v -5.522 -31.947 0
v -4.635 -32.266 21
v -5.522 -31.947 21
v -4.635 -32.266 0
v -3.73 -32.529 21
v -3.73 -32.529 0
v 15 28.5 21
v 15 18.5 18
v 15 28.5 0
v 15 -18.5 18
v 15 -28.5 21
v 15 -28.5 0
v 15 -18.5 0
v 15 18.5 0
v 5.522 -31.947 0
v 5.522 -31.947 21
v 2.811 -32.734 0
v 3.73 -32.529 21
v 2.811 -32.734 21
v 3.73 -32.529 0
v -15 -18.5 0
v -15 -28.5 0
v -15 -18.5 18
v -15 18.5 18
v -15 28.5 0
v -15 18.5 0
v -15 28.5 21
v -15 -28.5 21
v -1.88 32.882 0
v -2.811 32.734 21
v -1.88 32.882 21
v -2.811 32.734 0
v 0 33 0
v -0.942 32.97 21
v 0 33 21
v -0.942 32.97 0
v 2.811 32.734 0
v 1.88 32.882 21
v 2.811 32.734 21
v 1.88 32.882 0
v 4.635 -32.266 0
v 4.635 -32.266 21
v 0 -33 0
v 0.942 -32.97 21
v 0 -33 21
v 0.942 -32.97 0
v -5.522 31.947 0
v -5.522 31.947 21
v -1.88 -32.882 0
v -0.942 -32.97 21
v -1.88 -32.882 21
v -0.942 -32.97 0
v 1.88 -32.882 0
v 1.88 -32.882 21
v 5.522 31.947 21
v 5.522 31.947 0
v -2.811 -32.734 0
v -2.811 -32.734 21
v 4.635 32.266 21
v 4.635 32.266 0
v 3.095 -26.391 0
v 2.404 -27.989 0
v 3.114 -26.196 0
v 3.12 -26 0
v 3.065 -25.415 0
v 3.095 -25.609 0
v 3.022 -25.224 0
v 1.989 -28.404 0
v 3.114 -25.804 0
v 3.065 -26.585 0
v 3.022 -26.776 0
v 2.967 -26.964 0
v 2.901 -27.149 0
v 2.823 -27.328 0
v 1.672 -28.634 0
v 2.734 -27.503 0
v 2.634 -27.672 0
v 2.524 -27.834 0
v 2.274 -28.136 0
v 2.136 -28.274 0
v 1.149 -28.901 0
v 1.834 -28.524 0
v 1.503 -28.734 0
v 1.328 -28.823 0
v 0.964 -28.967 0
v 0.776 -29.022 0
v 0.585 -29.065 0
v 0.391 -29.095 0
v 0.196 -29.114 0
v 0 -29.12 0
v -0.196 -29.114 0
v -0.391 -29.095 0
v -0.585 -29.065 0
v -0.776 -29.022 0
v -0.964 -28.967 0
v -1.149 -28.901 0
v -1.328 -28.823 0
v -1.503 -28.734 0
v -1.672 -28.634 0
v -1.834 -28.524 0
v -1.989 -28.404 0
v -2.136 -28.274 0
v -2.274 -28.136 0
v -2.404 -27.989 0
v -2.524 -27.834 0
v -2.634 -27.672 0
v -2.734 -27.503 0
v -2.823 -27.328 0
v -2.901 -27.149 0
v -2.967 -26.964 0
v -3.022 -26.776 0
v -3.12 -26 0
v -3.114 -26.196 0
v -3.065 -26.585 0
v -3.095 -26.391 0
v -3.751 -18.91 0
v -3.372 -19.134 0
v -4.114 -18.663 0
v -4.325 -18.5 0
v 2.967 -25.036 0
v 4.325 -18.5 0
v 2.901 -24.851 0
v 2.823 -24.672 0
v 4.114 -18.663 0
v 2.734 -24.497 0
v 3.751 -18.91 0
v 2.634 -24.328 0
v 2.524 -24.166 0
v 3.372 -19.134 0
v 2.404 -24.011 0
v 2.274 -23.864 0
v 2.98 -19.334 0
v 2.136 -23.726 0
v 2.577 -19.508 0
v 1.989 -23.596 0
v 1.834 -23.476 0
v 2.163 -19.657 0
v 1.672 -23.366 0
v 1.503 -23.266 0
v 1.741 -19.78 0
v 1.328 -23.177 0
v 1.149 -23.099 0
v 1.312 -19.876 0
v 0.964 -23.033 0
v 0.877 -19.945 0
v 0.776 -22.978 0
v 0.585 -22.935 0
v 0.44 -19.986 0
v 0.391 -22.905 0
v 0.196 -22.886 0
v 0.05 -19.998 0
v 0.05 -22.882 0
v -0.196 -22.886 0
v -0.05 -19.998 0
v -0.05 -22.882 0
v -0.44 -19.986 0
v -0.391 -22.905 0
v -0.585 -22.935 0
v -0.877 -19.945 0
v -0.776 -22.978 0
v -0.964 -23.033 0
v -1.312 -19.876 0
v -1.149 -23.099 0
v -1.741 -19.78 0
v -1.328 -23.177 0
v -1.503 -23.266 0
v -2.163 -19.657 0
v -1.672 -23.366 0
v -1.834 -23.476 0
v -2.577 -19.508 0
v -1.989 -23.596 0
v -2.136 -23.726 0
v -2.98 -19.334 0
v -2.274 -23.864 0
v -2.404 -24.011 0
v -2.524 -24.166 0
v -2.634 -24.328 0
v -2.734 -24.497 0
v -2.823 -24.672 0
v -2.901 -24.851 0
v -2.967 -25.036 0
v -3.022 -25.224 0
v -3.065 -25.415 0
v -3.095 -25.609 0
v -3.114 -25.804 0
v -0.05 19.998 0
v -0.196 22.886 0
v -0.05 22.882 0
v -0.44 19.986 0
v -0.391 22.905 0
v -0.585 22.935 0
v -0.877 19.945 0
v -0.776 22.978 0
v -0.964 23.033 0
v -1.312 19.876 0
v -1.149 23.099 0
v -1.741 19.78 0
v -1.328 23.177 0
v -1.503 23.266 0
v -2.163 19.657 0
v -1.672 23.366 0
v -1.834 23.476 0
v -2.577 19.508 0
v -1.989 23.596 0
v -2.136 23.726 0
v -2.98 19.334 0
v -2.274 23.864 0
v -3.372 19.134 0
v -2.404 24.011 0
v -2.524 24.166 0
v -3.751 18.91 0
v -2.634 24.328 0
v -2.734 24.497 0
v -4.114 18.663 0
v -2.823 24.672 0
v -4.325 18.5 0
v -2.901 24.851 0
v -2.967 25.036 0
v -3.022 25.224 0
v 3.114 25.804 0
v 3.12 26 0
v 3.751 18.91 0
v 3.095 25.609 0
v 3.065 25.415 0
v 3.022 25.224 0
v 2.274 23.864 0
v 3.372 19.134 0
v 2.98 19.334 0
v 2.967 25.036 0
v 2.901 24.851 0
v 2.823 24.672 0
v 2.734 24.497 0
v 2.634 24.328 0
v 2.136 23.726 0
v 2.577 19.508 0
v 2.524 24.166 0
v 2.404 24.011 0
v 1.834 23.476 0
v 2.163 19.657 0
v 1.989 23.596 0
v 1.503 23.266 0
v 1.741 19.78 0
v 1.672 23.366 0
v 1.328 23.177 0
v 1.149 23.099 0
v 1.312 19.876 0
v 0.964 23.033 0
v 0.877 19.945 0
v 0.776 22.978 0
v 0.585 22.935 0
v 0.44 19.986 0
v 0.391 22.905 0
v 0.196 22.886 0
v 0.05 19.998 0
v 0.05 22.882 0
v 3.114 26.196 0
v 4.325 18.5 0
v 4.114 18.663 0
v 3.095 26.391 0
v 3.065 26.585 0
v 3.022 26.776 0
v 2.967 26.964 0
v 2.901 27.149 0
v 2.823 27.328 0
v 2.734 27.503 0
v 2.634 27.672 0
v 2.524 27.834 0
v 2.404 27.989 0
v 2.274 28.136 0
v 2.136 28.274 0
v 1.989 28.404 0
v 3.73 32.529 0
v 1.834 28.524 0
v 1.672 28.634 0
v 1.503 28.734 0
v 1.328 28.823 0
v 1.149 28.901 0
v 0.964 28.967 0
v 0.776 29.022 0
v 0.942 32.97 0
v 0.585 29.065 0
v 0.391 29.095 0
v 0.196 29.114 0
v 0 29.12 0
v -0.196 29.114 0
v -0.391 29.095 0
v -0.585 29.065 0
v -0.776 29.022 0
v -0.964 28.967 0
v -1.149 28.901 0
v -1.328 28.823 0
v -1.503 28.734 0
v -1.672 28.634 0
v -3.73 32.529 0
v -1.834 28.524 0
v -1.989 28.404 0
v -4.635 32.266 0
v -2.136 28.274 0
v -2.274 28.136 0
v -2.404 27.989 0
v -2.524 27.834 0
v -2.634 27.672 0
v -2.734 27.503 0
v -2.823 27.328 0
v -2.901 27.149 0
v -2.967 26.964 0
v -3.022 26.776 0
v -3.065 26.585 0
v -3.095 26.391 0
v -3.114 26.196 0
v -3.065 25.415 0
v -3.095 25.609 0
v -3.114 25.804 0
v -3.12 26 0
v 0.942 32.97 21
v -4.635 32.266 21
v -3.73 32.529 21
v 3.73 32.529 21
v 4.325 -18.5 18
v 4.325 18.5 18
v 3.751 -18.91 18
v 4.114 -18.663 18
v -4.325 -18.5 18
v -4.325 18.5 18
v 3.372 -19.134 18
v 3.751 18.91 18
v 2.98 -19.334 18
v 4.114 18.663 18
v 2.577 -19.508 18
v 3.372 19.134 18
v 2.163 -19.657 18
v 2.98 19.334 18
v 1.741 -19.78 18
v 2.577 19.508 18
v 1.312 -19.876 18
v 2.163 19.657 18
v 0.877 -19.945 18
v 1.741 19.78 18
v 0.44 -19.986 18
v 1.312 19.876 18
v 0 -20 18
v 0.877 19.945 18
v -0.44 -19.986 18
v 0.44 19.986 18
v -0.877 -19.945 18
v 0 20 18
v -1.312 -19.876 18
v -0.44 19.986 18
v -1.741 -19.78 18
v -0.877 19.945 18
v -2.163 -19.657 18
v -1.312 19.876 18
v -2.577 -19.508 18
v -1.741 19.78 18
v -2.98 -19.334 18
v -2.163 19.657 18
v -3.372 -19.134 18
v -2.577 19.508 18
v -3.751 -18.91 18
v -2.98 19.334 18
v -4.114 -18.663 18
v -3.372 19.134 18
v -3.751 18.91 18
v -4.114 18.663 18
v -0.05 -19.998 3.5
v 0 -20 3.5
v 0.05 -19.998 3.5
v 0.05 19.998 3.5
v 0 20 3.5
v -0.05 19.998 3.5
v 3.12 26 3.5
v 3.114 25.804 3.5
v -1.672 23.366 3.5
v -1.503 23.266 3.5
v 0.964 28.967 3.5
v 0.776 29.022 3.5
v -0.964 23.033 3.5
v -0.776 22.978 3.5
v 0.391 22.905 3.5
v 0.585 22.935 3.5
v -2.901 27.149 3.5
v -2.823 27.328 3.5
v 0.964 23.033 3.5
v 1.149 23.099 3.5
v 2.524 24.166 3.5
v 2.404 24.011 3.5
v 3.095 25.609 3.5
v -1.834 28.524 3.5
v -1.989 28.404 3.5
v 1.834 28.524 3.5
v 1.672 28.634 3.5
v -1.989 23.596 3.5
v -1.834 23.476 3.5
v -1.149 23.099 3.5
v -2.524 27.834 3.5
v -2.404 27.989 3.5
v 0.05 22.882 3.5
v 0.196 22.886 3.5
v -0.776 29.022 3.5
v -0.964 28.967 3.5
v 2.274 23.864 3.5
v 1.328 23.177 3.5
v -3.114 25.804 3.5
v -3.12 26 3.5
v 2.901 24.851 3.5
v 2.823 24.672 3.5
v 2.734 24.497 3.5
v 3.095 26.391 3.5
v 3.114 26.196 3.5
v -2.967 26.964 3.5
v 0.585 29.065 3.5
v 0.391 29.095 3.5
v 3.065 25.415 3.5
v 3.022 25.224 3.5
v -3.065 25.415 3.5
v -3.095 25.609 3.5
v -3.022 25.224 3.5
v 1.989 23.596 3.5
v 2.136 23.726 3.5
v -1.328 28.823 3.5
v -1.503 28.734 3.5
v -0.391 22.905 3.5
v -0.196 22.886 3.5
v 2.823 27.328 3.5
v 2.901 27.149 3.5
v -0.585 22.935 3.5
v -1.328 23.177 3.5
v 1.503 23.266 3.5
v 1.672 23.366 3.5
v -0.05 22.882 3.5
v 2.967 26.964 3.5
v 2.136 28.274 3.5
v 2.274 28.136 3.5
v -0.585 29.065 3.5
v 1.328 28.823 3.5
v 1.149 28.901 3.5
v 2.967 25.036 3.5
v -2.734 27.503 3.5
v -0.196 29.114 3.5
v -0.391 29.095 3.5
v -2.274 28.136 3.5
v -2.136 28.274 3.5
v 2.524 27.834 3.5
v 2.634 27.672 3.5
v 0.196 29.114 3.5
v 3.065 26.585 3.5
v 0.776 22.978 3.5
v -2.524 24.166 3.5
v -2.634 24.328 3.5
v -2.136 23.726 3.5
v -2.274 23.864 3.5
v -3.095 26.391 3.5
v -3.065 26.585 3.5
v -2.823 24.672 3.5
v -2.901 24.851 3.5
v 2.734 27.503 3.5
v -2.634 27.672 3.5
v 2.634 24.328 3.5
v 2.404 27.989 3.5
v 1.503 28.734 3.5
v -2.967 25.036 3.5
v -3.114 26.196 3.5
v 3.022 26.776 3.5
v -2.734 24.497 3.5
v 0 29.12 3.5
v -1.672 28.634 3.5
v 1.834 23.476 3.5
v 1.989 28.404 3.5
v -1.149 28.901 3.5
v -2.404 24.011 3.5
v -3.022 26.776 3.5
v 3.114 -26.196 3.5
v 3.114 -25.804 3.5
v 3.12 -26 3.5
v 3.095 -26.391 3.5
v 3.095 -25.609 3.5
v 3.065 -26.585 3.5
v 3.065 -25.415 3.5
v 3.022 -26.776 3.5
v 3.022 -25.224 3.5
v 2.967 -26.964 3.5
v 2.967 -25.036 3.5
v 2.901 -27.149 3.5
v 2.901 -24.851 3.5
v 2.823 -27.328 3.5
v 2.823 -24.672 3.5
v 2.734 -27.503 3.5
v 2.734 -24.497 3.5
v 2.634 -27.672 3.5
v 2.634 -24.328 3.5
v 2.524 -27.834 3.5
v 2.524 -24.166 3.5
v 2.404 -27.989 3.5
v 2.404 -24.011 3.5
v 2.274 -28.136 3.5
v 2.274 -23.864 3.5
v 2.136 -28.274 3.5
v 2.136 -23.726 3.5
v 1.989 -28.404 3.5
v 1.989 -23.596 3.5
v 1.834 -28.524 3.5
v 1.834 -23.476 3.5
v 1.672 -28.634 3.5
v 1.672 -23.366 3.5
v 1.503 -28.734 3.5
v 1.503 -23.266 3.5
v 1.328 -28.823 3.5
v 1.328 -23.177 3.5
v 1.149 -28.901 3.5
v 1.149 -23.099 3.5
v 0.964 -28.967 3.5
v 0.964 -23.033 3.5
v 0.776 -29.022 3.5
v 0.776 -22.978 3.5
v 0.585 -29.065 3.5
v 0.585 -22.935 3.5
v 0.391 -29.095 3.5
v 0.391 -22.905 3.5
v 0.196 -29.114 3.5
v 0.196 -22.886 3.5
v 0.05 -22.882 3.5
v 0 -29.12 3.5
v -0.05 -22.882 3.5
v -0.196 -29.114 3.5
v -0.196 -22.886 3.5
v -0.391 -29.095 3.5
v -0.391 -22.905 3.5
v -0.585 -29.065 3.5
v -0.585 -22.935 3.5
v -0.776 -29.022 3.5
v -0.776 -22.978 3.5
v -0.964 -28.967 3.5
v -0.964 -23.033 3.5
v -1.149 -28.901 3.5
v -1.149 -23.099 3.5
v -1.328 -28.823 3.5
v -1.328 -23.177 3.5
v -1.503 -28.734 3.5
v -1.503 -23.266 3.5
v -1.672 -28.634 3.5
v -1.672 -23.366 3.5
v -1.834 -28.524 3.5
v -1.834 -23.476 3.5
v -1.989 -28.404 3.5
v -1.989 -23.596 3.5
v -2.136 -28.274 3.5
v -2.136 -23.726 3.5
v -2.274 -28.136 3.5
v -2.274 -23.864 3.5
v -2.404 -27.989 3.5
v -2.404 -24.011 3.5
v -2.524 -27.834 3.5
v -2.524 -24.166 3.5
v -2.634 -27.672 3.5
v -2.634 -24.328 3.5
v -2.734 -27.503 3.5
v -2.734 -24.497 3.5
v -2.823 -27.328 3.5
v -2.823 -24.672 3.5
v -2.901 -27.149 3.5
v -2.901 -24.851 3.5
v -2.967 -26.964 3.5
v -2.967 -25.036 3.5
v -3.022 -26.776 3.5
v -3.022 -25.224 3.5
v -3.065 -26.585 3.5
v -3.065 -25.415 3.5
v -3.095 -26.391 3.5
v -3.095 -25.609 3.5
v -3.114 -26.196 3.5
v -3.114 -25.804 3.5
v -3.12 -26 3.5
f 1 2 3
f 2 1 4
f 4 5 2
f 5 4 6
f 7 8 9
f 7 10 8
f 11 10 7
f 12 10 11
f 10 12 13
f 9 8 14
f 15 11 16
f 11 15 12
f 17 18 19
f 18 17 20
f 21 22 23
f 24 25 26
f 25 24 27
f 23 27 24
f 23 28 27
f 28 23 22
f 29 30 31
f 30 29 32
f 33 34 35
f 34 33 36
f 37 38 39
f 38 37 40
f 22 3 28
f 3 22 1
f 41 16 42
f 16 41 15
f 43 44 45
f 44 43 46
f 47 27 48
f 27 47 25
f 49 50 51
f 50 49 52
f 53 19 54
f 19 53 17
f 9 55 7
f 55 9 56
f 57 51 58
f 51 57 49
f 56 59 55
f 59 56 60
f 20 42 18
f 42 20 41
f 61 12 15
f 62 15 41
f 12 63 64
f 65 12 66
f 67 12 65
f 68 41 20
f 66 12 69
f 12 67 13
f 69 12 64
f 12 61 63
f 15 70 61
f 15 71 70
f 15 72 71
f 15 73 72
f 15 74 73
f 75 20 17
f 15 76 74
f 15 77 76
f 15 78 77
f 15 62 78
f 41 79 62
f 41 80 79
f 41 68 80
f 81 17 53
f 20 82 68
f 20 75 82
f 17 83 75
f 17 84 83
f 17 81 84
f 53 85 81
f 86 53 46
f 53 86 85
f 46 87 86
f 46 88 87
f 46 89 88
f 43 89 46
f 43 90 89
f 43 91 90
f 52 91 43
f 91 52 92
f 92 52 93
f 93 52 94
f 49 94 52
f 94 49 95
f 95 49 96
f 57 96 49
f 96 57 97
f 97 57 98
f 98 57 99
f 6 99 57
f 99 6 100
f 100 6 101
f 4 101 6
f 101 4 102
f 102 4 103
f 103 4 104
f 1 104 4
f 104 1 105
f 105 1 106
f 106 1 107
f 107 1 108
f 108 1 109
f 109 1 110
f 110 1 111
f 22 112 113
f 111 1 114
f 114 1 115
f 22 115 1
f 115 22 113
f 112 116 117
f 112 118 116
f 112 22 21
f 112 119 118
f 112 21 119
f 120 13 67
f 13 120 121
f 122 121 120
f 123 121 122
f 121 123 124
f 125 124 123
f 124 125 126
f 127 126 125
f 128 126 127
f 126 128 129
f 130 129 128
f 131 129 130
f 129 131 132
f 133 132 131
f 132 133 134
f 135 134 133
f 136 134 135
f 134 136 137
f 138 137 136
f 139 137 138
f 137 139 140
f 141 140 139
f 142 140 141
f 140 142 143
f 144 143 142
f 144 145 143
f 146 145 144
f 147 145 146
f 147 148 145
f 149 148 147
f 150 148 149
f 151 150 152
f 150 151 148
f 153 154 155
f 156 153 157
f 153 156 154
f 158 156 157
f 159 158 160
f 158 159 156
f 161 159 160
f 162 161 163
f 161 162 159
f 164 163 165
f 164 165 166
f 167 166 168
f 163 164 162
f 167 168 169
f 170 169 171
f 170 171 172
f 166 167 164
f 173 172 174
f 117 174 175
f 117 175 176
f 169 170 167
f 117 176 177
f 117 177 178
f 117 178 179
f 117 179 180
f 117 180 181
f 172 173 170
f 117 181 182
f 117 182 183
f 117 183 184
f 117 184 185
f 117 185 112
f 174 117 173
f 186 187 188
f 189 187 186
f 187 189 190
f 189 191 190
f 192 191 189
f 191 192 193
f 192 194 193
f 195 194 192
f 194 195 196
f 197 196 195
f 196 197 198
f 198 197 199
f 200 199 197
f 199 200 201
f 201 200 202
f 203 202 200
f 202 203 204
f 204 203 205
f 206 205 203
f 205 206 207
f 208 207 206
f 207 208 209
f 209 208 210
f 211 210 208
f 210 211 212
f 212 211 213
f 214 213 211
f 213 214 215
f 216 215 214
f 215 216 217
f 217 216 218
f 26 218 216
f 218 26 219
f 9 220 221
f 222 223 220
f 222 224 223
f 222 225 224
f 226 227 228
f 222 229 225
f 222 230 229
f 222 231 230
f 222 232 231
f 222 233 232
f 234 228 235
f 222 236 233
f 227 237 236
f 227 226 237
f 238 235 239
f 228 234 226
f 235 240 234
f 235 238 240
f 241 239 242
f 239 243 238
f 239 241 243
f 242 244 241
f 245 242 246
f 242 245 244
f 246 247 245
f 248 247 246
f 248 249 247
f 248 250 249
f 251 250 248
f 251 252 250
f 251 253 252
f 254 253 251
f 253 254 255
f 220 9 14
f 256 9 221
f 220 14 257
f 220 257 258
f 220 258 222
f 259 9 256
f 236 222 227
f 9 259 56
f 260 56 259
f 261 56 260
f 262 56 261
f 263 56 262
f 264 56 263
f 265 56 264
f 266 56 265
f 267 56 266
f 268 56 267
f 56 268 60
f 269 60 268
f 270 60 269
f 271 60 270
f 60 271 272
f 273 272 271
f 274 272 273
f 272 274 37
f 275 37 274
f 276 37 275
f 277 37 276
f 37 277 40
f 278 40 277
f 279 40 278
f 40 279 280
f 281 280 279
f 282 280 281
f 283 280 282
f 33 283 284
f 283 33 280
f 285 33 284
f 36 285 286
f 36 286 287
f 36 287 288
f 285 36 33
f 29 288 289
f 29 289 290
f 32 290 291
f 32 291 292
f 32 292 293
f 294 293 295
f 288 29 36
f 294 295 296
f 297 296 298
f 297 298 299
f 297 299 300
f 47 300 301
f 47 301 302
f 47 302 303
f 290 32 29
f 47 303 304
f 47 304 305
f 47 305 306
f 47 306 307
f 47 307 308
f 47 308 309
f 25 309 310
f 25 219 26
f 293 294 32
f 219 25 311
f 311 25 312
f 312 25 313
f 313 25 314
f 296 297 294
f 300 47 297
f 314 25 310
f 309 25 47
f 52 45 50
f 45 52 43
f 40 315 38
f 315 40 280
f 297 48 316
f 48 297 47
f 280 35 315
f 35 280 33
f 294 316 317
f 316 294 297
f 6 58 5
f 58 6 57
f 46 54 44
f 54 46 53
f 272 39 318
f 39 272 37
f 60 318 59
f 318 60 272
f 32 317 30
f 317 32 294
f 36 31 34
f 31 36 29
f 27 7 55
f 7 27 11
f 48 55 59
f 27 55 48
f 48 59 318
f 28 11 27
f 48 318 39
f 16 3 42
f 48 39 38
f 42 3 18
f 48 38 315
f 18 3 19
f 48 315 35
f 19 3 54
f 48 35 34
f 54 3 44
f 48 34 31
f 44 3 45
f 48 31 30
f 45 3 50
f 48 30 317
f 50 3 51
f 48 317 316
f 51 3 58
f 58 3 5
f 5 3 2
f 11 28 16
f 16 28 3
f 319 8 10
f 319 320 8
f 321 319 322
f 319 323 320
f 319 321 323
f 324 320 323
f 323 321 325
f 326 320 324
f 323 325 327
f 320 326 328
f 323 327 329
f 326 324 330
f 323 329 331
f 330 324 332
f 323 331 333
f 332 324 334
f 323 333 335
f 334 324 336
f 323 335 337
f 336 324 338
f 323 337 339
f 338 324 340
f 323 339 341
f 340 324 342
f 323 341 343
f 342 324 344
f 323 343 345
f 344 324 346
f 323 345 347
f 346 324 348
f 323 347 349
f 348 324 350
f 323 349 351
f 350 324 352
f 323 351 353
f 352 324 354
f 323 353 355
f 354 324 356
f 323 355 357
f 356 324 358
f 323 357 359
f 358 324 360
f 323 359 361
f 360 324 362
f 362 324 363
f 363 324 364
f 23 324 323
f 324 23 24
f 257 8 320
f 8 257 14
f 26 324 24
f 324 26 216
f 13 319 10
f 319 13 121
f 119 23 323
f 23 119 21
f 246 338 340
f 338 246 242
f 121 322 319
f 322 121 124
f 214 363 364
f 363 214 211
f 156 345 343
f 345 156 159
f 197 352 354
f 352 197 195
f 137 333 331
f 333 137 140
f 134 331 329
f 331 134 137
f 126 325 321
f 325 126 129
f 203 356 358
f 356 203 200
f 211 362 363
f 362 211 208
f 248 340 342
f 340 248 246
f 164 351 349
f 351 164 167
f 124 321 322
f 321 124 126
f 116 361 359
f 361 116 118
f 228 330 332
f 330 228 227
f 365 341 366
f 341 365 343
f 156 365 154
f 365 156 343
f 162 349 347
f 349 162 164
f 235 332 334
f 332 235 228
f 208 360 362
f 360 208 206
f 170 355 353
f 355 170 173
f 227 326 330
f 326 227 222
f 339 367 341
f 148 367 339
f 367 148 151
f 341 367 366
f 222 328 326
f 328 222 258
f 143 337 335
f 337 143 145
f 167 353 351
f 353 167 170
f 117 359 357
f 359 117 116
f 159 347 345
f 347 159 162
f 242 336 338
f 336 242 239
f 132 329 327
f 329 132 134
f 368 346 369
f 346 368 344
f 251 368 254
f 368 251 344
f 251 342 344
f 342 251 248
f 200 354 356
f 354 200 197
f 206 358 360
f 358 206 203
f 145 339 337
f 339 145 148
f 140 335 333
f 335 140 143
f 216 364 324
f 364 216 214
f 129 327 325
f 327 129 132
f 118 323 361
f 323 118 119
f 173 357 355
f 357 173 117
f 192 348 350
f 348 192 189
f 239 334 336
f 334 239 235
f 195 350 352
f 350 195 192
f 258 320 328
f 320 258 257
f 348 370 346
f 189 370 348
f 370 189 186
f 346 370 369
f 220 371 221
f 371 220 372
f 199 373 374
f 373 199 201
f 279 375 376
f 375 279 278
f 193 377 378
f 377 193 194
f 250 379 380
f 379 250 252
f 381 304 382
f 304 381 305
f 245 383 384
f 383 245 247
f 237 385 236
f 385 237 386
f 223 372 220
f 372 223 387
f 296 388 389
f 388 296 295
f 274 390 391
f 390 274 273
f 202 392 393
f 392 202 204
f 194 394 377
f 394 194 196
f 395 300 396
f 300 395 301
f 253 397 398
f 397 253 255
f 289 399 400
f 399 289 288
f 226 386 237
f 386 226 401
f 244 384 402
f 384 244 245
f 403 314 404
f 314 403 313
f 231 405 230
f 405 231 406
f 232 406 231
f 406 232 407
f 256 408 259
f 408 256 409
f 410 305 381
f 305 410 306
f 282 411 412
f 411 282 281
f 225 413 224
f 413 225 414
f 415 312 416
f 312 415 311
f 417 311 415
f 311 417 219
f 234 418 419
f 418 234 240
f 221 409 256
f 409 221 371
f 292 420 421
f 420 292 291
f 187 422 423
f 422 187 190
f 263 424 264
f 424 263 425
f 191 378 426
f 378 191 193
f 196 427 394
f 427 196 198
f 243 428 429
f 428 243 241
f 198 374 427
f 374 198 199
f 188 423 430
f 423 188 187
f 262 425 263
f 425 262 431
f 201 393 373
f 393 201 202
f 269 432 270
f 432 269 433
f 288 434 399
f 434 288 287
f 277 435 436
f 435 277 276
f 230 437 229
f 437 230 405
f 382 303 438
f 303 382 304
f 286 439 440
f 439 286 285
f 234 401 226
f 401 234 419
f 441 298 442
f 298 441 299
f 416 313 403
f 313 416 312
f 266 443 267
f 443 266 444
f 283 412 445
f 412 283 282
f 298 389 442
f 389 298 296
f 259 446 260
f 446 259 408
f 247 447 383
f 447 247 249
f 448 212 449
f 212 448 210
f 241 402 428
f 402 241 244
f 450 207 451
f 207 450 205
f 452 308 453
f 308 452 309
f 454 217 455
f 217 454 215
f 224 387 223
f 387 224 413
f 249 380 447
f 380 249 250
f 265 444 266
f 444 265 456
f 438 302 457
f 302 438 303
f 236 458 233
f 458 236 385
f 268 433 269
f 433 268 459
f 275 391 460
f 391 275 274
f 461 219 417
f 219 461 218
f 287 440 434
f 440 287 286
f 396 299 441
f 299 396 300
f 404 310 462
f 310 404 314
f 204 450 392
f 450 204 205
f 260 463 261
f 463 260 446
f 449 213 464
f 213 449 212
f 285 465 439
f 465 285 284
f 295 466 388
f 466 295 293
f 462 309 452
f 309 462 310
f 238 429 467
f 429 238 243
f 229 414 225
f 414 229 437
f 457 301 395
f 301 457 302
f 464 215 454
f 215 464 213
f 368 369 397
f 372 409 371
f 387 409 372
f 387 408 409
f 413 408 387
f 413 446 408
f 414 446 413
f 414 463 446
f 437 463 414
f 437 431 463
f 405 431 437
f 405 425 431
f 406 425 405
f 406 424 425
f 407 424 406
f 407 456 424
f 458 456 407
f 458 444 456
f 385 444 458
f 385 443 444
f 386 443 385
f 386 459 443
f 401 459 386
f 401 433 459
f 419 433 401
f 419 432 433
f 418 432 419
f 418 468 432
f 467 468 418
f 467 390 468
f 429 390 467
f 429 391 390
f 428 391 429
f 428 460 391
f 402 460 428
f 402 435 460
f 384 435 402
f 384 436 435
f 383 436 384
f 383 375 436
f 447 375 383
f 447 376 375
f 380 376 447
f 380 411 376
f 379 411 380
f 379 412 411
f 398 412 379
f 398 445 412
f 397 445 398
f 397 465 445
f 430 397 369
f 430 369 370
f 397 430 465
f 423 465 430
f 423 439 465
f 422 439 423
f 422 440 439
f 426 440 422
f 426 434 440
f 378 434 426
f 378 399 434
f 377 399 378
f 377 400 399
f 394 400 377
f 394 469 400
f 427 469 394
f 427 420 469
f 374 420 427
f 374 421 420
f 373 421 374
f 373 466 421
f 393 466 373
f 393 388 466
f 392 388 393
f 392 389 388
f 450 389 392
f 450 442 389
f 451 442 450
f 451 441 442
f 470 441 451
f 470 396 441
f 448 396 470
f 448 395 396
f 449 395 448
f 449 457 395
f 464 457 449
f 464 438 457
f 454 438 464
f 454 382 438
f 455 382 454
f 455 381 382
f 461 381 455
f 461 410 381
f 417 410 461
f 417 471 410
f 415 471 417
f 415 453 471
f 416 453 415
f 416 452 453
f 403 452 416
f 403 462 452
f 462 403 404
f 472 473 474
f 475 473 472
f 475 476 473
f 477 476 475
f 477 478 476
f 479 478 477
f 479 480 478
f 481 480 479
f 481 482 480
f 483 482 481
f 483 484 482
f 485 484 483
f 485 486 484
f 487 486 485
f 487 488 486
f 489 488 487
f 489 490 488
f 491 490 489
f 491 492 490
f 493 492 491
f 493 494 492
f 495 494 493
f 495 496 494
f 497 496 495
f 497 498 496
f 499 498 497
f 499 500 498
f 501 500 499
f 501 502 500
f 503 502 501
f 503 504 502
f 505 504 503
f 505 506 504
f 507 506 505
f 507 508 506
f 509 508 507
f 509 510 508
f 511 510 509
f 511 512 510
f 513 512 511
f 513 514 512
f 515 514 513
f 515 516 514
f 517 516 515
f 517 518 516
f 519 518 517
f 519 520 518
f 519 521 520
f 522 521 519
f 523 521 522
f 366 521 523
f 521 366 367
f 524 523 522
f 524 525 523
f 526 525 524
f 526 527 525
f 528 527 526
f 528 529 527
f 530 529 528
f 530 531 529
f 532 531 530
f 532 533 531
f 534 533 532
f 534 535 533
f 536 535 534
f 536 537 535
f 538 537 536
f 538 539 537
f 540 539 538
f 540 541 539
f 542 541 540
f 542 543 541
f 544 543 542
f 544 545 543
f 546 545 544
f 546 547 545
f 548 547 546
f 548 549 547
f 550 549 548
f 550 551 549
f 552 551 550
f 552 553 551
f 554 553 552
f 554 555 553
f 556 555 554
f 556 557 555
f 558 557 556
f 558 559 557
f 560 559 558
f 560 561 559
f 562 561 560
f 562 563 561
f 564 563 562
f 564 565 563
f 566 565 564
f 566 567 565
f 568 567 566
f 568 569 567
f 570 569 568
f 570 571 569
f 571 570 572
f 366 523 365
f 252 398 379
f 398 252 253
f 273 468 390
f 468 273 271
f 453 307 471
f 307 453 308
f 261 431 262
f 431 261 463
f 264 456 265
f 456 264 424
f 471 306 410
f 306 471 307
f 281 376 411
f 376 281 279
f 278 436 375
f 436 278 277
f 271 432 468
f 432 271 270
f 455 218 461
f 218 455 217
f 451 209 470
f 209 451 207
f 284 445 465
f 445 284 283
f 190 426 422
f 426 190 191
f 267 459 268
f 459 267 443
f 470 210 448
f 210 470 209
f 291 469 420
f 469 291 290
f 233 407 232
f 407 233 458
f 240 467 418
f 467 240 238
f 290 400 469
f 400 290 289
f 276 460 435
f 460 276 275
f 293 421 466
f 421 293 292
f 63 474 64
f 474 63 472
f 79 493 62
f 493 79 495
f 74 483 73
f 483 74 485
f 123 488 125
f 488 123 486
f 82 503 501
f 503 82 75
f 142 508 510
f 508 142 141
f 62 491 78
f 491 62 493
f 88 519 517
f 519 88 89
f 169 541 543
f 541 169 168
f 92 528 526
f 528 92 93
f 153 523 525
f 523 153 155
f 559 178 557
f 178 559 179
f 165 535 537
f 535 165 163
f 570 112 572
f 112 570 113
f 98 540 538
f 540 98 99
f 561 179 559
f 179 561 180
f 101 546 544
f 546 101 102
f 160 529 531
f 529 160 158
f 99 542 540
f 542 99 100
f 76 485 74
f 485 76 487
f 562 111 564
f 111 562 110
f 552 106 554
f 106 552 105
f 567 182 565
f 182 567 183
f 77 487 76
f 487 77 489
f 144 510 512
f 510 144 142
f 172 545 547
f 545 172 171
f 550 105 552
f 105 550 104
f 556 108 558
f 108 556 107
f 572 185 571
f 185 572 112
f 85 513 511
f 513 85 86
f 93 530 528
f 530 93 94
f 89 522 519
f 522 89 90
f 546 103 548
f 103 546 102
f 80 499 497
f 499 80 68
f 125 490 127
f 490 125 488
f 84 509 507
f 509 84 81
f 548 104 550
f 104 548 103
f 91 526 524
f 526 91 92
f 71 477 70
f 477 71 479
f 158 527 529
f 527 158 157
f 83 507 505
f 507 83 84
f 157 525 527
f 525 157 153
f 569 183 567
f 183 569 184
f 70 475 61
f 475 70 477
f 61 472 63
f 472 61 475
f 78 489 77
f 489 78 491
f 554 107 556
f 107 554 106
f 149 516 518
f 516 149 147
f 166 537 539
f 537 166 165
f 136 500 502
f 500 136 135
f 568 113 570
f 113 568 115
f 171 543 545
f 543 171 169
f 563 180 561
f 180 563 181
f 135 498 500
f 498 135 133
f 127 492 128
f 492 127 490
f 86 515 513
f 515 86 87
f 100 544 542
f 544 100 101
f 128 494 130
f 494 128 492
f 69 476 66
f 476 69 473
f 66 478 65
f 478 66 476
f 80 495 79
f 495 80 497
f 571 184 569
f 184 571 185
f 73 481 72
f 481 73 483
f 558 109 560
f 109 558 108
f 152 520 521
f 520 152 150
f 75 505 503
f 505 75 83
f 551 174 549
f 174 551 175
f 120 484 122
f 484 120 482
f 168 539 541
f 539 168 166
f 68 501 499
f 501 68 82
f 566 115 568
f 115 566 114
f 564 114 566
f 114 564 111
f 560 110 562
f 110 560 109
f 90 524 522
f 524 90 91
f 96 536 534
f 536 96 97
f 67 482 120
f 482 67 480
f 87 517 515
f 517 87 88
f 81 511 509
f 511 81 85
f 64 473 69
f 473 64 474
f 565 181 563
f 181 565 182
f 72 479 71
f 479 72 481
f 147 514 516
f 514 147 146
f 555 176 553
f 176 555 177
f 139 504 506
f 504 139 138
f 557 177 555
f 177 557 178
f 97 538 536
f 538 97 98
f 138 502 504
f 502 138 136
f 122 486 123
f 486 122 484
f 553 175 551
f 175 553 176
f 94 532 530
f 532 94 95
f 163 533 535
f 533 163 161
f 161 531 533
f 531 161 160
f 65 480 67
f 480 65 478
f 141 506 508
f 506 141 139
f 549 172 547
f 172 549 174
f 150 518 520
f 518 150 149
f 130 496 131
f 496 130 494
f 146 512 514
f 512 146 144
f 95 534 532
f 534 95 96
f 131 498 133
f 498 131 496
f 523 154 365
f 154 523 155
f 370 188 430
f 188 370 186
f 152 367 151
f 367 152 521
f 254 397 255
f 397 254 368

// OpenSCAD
difference(){
    linear_extrude(21) hull(){
        square([30,57],center=true);
        translate([0,18,0]) circle(15,$fn=100);
        translate([0,-18,0]) circle(15,$fn=100);
    }
    // メインくり抜き
    linear_extrude(18) square([30,37],center=true);
    // 良い感じのくぼみ（兼ストッパー）
    linear_extrude(18) hull(){
        translate([0,-13,0]) circle(7,$fn=100);
        translate([0,13,0]) circle(7,$fn=100);
    }
    // 磁石穴
    translate([0,26,0]) linear_extrude(3.5) circle(3.12,$fn=100);
    translate([0,-26,0]) linear_extrude(3.5) circle(3.12,$fn=100);
    // 溝
    linear_extrude(3.5) square([0.1,55],center=true);
}
